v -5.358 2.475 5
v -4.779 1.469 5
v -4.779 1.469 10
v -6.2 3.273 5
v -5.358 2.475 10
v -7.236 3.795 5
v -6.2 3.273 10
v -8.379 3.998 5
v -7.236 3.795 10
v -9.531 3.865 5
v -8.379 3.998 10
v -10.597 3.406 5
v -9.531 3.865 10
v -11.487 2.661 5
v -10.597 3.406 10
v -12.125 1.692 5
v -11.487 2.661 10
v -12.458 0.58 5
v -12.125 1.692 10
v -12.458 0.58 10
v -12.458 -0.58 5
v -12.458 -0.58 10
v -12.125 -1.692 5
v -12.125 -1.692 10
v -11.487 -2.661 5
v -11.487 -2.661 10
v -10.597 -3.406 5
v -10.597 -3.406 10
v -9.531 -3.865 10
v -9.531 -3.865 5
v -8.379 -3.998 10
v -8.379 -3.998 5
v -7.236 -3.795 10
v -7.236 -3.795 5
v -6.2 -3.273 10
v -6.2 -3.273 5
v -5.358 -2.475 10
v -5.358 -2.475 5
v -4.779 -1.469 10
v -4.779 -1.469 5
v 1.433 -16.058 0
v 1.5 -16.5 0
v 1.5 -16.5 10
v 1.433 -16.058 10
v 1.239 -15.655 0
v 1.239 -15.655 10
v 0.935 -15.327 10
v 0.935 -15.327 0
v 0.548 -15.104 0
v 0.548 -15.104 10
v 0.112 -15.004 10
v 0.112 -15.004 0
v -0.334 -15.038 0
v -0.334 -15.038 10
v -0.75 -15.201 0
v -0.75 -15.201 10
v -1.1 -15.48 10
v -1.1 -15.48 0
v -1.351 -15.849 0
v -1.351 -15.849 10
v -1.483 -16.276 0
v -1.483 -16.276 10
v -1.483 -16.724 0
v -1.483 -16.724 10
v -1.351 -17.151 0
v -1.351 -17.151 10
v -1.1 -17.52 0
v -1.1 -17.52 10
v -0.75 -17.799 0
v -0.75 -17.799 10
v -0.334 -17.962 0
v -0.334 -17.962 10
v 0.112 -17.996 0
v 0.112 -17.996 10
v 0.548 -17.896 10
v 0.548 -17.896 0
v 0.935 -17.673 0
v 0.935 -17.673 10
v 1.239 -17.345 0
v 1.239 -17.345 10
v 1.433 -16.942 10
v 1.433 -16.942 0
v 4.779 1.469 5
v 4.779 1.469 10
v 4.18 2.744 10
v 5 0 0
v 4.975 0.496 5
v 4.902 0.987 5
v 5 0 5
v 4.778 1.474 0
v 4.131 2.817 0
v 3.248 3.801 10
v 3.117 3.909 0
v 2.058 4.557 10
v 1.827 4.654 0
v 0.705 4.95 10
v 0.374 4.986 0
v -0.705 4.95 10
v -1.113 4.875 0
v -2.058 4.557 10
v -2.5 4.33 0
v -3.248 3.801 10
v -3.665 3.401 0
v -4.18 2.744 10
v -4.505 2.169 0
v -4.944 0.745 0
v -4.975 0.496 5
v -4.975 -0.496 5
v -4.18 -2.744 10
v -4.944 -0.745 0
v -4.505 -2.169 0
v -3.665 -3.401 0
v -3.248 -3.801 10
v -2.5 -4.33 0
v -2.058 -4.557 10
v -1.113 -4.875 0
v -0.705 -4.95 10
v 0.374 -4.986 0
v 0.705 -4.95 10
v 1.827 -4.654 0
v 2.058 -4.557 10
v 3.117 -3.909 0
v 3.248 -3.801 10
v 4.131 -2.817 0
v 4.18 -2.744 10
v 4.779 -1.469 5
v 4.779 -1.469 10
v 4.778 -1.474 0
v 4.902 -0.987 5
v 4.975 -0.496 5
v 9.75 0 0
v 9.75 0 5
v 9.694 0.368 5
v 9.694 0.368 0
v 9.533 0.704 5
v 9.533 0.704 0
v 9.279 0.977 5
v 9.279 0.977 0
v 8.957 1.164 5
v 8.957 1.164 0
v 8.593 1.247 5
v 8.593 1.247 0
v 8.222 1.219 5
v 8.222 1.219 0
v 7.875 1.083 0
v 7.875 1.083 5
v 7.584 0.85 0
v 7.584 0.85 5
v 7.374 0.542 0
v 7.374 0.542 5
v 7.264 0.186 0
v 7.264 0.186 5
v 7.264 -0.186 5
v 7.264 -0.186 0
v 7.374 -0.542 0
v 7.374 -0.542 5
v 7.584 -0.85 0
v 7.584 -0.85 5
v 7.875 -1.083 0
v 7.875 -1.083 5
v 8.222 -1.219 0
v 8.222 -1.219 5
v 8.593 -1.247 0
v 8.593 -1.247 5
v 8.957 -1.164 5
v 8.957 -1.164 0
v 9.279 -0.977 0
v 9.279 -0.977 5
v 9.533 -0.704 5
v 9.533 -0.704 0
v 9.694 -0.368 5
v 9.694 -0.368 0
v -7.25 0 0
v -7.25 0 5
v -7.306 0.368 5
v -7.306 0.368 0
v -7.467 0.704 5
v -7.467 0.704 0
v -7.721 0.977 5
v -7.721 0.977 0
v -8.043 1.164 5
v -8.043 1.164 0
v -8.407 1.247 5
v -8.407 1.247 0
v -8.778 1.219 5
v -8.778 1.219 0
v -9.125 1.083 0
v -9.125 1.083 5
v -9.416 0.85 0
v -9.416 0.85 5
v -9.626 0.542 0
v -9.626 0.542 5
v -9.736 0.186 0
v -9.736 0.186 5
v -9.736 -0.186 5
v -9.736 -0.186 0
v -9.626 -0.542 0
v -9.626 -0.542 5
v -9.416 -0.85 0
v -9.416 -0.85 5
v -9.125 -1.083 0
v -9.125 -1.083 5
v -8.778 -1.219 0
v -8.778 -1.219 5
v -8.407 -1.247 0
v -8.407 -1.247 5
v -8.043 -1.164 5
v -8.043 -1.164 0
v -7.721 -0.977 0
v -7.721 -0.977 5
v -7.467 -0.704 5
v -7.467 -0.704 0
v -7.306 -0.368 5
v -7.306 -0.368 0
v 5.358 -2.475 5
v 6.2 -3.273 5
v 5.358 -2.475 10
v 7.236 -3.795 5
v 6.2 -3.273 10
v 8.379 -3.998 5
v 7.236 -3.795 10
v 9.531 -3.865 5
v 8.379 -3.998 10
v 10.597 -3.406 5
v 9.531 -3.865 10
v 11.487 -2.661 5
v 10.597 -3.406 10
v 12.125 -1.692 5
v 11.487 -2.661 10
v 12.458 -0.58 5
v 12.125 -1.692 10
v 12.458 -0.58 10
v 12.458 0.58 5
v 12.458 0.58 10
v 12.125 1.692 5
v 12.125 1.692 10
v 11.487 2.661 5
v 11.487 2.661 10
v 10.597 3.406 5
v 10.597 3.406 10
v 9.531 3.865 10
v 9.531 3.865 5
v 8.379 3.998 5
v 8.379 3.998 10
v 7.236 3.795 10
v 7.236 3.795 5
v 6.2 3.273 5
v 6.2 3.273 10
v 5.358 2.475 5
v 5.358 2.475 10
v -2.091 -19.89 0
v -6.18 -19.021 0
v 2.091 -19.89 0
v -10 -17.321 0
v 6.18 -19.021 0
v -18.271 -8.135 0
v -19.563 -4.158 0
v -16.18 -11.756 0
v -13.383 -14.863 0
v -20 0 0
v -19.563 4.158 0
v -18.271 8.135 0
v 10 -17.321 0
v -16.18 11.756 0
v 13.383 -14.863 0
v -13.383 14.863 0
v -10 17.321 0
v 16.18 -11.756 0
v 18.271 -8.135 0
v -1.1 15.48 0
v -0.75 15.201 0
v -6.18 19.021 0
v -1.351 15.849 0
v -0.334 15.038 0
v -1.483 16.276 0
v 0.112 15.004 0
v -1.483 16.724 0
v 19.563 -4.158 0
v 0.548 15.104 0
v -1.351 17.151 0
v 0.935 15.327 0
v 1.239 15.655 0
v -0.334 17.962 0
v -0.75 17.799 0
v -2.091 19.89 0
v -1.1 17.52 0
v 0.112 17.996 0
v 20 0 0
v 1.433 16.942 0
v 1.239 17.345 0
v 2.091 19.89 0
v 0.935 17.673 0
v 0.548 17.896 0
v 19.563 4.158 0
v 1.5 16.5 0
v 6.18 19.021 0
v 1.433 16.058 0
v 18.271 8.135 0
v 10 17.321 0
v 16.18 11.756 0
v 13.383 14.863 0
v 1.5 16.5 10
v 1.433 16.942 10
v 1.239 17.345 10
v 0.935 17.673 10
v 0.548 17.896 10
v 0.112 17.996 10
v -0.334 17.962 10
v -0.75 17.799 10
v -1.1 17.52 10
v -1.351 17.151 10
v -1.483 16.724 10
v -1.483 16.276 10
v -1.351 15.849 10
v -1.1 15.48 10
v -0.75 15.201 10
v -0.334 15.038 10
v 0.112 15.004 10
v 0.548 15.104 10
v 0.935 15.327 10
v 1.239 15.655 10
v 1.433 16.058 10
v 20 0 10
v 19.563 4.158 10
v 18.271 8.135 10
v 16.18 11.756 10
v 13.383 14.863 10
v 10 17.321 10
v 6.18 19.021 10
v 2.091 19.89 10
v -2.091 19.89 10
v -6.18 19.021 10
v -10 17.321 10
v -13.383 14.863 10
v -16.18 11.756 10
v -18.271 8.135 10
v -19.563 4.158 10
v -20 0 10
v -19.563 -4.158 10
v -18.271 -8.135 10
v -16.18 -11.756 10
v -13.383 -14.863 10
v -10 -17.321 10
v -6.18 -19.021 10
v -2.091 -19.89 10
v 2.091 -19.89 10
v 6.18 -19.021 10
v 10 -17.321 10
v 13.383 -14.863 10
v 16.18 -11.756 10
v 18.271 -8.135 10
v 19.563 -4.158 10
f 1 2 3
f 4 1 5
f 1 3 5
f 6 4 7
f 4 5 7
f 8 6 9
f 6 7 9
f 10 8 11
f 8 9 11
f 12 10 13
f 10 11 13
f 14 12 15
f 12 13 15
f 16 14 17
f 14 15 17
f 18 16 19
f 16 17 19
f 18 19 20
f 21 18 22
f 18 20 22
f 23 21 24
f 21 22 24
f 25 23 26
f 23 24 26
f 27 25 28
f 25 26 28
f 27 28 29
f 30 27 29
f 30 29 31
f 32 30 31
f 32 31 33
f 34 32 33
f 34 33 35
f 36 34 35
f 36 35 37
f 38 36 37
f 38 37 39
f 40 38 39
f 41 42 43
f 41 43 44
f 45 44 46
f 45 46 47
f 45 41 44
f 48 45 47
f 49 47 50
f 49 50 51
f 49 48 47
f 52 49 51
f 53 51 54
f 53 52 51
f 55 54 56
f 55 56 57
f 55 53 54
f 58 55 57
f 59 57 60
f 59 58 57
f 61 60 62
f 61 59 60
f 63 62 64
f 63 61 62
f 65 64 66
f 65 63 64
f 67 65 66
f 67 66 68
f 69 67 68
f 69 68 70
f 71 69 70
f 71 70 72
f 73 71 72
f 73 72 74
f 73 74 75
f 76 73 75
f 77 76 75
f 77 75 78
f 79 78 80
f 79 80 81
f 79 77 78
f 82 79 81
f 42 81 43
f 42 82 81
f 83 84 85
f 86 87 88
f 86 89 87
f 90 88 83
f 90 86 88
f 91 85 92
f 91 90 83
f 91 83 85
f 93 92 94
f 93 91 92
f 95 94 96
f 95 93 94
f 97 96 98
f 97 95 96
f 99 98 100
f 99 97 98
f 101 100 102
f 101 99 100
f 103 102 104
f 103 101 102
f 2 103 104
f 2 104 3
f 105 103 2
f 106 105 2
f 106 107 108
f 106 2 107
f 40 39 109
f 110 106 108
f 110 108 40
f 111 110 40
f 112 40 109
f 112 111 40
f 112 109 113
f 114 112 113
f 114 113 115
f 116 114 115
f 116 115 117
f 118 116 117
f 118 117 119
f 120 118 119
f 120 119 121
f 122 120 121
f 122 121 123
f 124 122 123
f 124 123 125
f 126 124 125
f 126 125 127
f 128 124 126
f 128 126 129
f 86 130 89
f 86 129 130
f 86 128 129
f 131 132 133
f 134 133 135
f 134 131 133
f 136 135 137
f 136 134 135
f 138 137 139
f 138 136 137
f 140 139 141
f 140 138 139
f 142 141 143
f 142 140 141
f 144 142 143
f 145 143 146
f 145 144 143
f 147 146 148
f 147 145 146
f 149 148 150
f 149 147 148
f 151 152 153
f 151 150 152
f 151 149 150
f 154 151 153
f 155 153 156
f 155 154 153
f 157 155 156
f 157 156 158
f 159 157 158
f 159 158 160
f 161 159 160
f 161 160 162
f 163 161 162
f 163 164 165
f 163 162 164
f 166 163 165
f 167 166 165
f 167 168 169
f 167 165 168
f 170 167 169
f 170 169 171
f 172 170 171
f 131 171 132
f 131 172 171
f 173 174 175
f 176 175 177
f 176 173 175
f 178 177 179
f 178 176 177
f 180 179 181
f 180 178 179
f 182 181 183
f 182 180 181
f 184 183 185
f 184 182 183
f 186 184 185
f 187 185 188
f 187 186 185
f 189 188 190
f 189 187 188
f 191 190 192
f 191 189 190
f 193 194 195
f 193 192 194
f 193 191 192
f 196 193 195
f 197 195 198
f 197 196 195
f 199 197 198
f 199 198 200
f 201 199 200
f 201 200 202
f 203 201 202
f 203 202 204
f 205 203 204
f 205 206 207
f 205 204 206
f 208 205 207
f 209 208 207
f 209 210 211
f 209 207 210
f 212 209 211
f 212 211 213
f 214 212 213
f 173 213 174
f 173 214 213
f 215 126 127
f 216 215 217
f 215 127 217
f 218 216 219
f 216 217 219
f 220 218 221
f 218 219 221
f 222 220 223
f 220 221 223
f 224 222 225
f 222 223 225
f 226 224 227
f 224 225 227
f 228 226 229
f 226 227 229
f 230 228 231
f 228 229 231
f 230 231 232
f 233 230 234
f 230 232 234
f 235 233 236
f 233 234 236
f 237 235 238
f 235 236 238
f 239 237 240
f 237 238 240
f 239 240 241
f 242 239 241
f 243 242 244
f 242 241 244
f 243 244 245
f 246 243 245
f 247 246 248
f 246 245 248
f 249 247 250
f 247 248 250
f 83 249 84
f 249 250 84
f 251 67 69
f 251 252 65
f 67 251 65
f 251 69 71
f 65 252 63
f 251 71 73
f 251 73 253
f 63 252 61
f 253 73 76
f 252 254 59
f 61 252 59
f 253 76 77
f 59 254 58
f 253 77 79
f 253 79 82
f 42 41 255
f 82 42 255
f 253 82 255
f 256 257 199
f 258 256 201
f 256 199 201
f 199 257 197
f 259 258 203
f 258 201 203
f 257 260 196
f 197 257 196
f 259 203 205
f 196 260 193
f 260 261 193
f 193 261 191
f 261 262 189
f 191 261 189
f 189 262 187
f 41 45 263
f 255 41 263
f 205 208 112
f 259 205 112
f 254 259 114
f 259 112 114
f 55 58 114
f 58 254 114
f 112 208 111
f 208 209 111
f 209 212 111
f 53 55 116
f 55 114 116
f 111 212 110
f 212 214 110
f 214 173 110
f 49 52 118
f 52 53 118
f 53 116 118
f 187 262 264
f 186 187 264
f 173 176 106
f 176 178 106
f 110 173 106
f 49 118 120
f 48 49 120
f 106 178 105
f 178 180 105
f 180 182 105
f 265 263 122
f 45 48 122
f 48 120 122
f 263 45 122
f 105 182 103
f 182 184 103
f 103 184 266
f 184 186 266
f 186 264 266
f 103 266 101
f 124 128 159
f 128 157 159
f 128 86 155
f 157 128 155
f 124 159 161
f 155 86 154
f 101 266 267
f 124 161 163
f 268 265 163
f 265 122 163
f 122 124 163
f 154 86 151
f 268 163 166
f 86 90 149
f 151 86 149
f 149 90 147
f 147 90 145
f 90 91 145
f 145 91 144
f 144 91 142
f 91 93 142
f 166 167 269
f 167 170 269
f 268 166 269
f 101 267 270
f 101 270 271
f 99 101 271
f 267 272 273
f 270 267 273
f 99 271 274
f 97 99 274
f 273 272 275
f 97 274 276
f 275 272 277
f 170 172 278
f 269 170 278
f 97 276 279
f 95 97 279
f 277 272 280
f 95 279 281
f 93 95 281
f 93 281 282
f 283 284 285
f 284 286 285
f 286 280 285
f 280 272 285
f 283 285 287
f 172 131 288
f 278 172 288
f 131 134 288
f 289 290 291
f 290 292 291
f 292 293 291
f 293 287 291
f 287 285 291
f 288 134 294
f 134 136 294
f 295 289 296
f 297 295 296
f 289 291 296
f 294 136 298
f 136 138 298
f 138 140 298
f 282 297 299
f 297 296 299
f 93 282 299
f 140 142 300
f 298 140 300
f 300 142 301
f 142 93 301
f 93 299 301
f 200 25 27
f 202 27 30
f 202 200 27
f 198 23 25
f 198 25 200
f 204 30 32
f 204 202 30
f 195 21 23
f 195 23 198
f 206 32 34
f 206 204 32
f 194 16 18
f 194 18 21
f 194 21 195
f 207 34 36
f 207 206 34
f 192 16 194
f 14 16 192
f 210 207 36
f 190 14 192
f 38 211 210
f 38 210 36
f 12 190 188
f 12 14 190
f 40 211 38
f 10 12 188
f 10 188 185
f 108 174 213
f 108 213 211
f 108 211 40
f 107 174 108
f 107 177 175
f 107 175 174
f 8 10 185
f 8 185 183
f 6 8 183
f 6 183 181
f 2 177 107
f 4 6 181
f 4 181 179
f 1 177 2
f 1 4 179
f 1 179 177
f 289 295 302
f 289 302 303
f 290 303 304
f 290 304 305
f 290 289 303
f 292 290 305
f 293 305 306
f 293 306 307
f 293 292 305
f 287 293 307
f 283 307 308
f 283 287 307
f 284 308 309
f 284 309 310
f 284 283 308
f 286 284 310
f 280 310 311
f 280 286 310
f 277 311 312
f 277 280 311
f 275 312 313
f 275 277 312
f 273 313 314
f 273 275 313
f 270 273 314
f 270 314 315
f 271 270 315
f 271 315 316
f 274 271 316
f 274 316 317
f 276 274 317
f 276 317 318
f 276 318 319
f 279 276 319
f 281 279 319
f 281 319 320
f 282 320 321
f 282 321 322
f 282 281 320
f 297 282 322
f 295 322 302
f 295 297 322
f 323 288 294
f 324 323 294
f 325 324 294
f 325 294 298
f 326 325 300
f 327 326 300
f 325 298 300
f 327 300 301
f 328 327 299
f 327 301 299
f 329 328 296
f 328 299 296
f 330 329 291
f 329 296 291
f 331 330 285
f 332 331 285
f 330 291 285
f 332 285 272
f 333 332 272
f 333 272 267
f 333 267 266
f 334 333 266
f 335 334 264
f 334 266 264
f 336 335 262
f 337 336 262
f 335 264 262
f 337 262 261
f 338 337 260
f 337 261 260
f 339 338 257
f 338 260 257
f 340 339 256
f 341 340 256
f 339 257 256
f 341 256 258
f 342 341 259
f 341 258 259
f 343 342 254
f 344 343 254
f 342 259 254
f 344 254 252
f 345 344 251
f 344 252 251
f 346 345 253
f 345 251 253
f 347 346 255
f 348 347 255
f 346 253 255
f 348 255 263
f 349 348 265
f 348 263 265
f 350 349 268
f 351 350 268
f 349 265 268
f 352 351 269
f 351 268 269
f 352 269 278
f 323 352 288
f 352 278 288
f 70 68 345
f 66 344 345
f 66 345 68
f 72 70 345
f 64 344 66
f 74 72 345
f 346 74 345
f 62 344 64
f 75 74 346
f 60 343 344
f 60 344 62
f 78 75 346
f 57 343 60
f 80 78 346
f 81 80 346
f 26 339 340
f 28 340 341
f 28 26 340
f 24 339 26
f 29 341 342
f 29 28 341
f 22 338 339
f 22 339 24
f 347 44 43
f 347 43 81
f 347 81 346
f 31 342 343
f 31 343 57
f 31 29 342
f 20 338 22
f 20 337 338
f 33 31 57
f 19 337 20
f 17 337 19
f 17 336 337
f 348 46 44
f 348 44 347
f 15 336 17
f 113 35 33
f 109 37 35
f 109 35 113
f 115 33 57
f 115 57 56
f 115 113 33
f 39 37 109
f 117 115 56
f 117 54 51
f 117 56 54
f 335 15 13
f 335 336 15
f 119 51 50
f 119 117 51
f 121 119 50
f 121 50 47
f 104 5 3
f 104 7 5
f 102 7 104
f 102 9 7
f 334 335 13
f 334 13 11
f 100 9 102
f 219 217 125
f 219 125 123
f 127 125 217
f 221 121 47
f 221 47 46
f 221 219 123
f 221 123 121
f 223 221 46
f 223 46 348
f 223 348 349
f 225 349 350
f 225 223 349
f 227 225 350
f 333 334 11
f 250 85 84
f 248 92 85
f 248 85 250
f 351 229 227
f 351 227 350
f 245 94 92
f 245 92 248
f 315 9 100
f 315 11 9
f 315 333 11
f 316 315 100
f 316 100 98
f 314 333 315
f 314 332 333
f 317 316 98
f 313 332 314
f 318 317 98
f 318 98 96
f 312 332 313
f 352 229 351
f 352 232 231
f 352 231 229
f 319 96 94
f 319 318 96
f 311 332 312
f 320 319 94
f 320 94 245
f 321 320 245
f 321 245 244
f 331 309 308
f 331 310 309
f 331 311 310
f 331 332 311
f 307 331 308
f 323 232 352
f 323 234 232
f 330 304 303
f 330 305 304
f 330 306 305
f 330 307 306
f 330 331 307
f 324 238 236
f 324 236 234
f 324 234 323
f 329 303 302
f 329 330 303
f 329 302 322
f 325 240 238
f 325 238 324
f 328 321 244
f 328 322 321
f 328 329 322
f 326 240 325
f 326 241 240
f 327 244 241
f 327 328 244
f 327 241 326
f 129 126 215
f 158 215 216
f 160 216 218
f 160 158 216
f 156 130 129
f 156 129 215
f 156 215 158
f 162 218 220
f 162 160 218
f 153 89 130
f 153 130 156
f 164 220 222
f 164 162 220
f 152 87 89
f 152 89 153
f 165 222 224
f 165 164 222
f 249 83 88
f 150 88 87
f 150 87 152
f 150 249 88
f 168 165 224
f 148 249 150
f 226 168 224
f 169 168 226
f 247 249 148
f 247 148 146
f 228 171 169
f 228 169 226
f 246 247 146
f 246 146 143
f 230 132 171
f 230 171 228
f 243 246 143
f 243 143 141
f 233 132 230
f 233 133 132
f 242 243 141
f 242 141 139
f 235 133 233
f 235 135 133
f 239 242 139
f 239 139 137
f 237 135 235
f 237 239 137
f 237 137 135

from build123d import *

# Parameters (mm, degrees)
SKETCH1_R           = 20
SKETCH1_R_2         = 1.25
SKETCH1_R_3         = 5
SKETCH1_R_4         = 1.5
BOSS_EXTRUDE1_DEPTH = 10
SKETCH2_R           = 4
CUT_EXTRUDE1_DEPTH  = 5


with BuildPart() as part:
    # Sketch1 → Boss-Extrude1 (new body)
    with BuildSketch(Plane.XY):
        Circle(SKETCH1_R)
        with Locations((-8.5, 0)):
            Circle(SKETCH1_R_2, mode=Mode.SUBTRACT)
        with Locations((8.5, 0)):
            Circle(SKETCH1_R_2, mode=Mode.SUBTRACT)
        Circle(SKETCH1_R_3, mode=Mode.SUBTRACT)
        with Locations((0, 16.5)):
            Circle(SKETCH1_R_4, mode=Mode.SUBTRACT)
        with Locations((0, -16.5)):
            Circle(SKETCH1_R_4, mode=Mode.SUBTRACT)
    extrude(amount=BOSS_EXTRUDE1_DEPTH)

    # Sketch2 → Cut-Extrude1 (cut)
    with BuildSketch(Plane.XY.offset(10)):
        with Locations((8.5, 0)):
            Circle(SKETCH2_R)
        with Locations((-8.5, 0)):
            Circle(SKETCH2_R)
    extrude(amount=-CUT_EXTRUDE1_DEPTH, mode=Mode.SUBTRACT)


solid = part.part
